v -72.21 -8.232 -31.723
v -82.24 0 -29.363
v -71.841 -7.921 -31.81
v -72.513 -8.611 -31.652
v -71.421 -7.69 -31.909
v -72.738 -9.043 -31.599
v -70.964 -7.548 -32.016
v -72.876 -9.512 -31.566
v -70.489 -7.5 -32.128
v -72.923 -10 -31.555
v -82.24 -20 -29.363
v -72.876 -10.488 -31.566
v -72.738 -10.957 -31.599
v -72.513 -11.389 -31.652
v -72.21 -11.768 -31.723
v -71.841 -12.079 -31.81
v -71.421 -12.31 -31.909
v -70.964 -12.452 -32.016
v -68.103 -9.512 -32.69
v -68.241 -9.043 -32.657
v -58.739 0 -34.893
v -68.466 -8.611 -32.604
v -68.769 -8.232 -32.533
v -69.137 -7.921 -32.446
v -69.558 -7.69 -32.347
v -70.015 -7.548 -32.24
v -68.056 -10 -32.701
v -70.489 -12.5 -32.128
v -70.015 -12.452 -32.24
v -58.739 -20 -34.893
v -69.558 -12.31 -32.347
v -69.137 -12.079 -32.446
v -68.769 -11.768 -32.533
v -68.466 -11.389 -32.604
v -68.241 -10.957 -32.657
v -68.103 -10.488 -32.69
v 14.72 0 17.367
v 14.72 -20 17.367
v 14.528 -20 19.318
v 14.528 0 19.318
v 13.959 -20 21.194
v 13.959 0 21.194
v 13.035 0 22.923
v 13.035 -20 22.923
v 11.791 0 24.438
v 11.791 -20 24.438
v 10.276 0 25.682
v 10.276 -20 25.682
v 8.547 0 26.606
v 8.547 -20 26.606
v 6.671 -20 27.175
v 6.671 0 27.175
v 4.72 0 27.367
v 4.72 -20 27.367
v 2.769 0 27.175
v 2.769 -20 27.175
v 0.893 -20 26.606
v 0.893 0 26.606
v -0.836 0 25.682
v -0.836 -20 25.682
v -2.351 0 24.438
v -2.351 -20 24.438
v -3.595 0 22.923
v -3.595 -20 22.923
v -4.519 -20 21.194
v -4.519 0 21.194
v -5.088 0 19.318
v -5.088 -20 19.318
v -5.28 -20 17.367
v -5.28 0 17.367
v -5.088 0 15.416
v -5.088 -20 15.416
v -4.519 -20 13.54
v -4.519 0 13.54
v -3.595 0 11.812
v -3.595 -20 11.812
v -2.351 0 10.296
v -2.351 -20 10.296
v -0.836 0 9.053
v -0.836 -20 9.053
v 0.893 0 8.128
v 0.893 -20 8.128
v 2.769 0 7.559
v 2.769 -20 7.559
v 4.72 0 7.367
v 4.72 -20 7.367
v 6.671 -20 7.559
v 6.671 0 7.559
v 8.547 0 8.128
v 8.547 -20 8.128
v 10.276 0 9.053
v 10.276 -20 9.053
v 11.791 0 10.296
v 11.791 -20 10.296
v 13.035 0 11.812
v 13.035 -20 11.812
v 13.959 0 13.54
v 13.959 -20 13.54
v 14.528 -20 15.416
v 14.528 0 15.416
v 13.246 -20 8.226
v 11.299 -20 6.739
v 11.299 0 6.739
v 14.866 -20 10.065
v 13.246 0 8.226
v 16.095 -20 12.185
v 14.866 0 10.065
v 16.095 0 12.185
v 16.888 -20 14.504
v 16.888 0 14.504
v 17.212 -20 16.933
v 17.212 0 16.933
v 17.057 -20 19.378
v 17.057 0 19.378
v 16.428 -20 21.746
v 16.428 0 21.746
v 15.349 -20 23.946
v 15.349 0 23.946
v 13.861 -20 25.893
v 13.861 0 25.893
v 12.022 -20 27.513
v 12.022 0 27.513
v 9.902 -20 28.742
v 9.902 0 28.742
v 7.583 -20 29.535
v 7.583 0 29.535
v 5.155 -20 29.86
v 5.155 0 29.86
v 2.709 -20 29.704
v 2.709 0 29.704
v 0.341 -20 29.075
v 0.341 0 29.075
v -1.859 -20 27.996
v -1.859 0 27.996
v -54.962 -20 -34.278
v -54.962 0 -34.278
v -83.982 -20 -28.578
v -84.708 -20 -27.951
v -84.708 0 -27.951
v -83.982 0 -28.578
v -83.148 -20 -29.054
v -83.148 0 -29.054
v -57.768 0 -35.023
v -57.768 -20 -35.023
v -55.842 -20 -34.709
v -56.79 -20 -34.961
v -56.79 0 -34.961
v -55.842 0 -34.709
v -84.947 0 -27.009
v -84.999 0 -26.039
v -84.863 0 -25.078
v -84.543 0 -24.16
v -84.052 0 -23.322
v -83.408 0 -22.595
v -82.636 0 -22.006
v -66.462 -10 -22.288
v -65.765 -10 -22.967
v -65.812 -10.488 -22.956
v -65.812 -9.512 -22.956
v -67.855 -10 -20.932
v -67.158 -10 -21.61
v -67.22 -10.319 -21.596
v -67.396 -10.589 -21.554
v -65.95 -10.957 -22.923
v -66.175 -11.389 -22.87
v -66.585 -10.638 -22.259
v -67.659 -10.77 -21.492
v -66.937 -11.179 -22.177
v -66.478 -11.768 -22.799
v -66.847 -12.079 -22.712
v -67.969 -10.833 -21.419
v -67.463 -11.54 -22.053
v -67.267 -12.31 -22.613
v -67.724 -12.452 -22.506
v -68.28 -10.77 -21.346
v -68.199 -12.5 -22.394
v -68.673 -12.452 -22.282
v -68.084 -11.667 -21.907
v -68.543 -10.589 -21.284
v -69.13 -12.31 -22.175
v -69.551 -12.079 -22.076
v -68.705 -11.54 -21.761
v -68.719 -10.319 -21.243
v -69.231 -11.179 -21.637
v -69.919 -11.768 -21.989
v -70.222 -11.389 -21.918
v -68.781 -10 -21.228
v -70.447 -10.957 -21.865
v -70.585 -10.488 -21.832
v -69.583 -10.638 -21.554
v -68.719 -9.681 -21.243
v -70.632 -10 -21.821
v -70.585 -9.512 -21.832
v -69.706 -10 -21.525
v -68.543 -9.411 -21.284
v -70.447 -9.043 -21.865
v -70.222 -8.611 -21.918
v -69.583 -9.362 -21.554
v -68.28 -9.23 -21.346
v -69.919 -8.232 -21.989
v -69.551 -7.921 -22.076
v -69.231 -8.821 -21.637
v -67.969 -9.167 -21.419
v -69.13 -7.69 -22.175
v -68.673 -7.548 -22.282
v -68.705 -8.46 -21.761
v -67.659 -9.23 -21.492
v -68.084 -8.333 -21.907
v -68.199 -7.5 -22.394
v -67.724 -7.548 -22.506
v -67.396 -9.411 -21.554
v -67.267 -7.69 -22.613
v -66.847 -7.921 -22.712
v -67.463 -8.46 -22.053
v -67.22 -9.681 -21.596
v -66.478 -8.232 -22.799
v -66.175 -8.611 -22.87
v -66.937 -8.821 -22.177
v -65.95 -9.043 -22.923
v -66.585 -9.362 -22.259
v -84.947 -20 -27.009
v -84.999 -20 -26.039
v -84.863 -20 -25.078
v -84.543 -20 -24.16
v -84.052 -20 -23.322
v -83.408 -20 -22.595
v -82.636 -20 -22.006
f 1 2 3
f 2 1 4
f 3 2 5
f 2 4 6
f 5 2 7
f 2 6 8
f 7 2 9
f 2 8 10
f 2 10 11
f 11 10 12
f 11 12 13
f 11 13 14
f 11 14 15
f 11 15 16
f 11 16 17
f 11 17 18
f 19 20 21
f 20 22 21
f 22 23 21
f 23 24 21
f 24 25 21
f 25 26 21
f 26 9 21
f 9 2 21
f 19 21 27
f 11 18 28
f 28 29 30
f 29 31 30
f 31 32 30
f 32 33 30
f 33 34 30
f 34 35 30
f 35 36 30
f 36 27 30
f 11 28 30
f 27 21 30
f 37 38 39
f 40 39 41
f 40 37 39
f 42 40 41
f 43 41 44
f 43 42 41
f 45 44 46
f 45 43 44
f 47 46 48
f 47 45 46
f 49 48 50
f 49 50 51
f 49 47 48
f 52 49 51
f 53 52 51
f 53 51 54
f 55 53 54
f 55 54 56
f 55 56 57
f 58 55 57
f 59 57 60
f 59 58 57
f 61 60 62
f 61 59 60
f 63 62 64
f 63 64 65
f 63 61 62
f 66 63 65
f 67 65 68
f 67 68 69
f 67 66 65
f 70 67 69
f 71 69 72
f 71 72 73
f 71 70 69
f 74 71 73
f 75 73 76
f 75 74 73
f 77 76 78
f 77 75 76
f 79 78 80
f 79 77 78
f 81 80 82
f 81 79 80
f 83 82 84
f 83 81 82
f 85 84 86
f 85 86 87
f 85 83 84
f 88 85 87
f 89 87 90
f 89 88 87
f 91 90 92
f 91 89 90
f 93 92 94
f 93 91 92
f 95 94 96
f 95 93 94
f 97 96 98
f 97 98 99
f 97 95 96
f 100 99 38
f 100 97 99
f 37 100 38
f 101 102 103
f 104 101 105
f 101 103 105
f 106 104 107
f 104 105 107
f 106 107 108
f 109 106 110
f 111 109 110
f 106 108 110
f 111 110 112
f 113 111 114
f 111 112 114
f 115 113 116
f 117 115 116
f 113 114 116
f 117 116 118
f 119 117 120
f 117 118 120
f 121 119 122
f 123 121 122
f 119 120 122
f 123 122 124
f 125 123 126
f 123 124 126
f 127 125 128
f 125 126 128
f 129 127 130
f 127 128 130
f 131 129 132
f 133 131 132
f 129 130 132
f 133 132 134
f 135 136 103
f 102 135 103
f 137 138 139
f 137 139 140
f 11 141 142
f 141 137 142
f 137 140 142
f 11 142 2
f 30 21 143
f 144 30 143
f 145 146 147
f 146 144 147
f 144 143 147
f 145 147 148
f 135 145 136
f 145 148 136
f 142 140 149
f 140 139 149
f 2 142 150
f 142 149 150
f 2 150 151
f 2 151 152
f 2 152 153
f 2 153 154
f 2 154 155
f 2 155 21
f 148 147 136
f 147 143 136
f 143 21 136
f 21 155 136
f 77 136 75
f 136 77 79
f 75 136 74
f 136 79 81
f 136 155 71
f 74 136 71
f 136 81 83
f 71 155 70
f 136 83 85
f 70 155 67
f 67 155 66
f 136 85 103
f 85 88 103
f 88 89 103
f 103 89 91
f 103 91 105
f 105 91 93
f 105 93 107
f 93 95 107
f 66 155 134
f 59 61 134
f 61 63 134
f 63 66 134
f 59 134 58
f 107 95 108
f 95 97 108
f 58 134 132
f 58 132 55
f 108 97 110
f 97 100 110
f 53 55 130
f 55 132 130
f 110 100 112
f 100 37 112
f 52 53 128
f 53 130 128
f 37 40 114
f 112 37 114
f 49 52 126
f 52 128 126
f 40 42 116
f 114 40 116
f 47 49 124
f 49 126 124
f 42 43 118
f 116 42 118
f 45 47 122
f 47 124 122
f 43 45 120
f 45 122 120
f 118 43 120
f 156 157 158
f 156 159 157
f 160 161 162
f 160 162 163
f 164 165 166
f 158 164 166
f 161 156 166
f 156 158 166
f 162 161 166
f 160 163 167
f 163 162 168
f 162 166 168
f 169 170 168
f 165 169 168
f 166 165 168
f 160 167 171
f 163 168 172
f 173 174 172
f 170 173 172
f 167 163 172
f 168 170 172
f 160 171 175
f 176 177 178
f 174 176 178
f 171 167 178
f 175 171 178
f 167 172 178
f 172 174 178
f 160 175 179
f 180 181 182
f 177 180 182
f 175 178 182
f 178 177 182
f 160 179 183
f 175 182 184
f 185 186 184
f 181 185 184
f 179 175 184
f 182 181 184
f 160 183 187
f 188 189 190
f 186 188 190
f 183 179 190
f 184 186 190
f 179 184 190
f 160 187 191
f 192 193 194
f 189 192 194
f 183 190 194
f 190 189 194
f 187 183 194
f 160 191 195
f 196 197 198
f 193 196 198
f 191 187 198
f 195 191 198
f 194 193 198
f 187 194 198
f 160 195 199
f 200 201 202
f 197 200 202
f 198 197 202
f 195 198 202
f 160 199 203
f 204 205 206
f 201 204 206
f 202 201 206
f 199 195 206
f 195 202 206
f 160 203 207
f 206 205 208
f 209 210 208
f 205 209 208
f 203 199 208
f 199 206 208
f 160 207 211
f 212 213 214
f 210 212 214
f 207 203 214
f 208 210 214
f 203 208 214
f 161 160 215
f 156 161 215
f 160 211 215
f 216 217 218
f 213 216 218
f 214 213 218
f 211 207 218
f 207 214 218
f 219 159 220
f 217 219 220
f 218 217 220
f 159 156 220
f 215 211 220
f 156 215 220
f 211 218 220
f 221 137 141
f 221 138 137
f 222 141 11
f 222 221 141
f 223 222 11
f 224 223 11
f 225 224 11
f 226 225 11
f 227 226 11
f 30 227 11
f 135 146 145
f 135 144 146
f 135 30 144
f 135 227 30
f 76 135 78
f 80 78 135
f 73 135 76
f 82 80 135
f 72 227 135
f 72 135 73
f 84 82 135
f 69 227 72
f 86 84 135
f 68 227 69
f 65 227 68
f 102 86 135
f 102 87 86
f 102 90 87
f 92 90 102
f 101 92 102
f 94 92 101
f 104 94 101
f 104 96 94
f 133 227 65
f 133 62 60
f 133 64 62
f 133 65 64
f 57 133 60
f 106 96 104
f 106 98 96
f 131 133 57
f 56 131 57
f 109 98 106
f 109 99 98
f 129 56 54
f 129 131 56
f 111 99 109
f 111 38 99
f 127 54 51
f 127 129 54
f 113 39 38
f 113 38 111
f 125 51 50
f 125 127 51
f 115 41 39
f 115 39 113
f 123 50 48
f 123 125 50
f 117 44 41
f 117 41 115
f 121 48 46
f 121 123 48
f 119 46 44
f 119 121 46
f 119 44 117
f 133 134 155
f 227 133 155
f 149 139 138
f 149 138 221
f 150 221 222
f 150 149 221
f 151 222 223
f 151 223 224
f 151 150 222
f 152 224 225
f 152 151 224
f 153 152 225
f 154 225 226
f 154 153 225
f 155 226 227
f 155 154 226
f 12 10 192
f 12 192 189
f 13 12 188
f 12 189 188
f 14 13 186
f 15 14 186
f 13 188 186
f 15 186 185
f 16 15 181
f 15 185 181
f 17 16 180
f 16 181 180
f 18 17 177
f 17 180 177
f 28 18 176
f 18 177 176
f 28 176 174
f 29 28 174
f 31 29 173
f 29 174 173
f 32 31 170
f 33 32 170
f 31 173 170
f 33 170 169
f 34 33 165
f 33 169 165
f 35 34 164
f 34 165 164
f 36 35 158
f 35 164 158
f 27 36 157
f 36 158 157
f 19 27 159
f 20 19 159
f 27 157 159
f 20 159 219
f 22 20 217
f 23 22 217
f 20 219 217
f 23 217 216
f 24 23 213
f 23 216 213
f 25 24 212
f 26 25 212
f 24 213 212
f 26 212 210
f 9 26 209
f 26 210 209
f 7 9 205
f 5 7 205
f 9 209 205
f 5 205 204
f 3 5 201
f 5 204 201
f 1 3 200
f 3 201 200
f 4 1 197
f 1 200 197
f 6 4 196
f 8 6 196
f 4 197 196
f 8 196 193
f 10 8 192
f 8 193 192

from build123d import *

# Parameters (mm, degrees)
F0_R        = 10
F1_DEPTH    = 20
F2_SIZE     = 20
F4_D        = 5
F4_DEPTH    = 10
F4_TIP      = 1.5021515476
F5_T1_DEPTH = 45
F5_T3_DEPTH = 30.3553390593


# Not quite as in the source:
# - a fillet or chamfer that OpenCascade refuses, or shapes differently, is made with other operations: its cross-section is extruded or revolved along the edge and cut away or added
# - a feature names something its author has since deleted; it is built from what else it names


with BuildPart() as f1:
    # F0 (on Front) → F1 (new body)
    with BuildSketch(Plane.XZ):
        with BuildLine():
            ThreePointArc((11.2991514202, 6.738710196), (15.6399466463, 11.2840038059), (17.2200345341, 17.3672200162))
            ThreePointArc((17.2200345341, 17.3672200162), (10.8032507445, 28.2871321284), (-1.8590823519, 27.9957298365))
            ThreePointArc((-1.8590823519, 27.9957298365), (-5.9084752861, 10.7881031302), (11.2991514202, 6.738710196))
        make_face()
        with Locations((4.7200345341, 17.3672200162)):
            Circle(F0_R, mode=Mode.SUBTRACT)
        with BuildLine():
            ThreePointArc((11.2991514202, 6.738710196), (-5.9084752861, 10.7881031302), (-1.8590823519, 27.9957298365))
            Line((-1.8590823519, 27.9957298365), (-86.8871609141, -24.6372052518))
            Line((-86.8871609141, -24.6372052518), (-73.728927142, -45.8942248924))
            Line((-73.728927142, -45.8942248924), (11.2991514202, 6.738710196))
        make_face()
    extrude(amount=F1_DEPTH)

    # F2
    f2_edges = [f1.edges().sort_by_distance(p)[0] for p in [
        (-73.728927, -10, -45.894225),
    ]]
    chamfer(f2_edges, length=F2_SIZE)

    # F4
    with Locations(Plane(origin=(-10.8625851344, 0, -46.1598350898), x_dir=(0.9734103626, 0, -0.2290682563), z_dir=(-0.2290682563, 0, -0.9734103626))):
        with Locations((-61.2555916321, 10)):
            Hole(F4_D / 2, depth=F4_DEPTH)
            with Locations((0, 0, -(F4_DEPTH + F4_TIP / 2))):  # 118° drill point
                Cone(0, F4_D / 2, F4_TIP, mode=Mode.SUBTRACT)

    # F5: fillet of radius 5 on 3 edges, made by hand

    # F5_s2 → F5_t1 (cut)
    with BuildSketch(Plane.XZ.offset(-12.5)):
        with BuildLine():
            ThreePointArc((-84.2555141597, -28.8886091799), (-84.8711620445, -25.1116211441), (-82.635756986, -22.0055584974))
            Line((-82.635756986, -22.0055584974), (-86.8871609141, -24.6372052518))
            Line((-86.8871609141, -24.6372052518), (-84.2555141597, -28.8886091799))
        make_face()
    extrude(amount=F5_T1_DEPTH, mode=Mode.SUBTRACT)

    # F5_s4 → F5_t3 (cut)
    with BuildSketch(Plane.XZ.offset(-5.1776695297)):
        with BuildLine():
            ThreePointArc((-85.3455779368, -27.1276200138), (-84.0148714695, -28.5542396802), (-82.2395152901, -29.3630250722))
            Line((-82.2395152901, -29.3630250722), (-84.2555141597, -28.8886091799))
            Line((-84.2555141597, -28.8886091799), (-85.3455779368, -27.1276200138))
        make_face()
        with BuildLine():
            ThreePointArc((-58.7393102993, -34.8932219824), (-56.7895862922, -34.9610428559), (-54.9623222634, -34.2775740977))
            Line((-54.9623222634, -34.2775740977), (-56.7233114296, -35.3676378747))
            Line((-56.7233114296, -35.3676378747), (-58.7393102993, -34.8932219824))
        make_face()
    extrude(amount=F5_T3_DEPTH, mode=Mode.SUBTRACT)


solid = f1.part
